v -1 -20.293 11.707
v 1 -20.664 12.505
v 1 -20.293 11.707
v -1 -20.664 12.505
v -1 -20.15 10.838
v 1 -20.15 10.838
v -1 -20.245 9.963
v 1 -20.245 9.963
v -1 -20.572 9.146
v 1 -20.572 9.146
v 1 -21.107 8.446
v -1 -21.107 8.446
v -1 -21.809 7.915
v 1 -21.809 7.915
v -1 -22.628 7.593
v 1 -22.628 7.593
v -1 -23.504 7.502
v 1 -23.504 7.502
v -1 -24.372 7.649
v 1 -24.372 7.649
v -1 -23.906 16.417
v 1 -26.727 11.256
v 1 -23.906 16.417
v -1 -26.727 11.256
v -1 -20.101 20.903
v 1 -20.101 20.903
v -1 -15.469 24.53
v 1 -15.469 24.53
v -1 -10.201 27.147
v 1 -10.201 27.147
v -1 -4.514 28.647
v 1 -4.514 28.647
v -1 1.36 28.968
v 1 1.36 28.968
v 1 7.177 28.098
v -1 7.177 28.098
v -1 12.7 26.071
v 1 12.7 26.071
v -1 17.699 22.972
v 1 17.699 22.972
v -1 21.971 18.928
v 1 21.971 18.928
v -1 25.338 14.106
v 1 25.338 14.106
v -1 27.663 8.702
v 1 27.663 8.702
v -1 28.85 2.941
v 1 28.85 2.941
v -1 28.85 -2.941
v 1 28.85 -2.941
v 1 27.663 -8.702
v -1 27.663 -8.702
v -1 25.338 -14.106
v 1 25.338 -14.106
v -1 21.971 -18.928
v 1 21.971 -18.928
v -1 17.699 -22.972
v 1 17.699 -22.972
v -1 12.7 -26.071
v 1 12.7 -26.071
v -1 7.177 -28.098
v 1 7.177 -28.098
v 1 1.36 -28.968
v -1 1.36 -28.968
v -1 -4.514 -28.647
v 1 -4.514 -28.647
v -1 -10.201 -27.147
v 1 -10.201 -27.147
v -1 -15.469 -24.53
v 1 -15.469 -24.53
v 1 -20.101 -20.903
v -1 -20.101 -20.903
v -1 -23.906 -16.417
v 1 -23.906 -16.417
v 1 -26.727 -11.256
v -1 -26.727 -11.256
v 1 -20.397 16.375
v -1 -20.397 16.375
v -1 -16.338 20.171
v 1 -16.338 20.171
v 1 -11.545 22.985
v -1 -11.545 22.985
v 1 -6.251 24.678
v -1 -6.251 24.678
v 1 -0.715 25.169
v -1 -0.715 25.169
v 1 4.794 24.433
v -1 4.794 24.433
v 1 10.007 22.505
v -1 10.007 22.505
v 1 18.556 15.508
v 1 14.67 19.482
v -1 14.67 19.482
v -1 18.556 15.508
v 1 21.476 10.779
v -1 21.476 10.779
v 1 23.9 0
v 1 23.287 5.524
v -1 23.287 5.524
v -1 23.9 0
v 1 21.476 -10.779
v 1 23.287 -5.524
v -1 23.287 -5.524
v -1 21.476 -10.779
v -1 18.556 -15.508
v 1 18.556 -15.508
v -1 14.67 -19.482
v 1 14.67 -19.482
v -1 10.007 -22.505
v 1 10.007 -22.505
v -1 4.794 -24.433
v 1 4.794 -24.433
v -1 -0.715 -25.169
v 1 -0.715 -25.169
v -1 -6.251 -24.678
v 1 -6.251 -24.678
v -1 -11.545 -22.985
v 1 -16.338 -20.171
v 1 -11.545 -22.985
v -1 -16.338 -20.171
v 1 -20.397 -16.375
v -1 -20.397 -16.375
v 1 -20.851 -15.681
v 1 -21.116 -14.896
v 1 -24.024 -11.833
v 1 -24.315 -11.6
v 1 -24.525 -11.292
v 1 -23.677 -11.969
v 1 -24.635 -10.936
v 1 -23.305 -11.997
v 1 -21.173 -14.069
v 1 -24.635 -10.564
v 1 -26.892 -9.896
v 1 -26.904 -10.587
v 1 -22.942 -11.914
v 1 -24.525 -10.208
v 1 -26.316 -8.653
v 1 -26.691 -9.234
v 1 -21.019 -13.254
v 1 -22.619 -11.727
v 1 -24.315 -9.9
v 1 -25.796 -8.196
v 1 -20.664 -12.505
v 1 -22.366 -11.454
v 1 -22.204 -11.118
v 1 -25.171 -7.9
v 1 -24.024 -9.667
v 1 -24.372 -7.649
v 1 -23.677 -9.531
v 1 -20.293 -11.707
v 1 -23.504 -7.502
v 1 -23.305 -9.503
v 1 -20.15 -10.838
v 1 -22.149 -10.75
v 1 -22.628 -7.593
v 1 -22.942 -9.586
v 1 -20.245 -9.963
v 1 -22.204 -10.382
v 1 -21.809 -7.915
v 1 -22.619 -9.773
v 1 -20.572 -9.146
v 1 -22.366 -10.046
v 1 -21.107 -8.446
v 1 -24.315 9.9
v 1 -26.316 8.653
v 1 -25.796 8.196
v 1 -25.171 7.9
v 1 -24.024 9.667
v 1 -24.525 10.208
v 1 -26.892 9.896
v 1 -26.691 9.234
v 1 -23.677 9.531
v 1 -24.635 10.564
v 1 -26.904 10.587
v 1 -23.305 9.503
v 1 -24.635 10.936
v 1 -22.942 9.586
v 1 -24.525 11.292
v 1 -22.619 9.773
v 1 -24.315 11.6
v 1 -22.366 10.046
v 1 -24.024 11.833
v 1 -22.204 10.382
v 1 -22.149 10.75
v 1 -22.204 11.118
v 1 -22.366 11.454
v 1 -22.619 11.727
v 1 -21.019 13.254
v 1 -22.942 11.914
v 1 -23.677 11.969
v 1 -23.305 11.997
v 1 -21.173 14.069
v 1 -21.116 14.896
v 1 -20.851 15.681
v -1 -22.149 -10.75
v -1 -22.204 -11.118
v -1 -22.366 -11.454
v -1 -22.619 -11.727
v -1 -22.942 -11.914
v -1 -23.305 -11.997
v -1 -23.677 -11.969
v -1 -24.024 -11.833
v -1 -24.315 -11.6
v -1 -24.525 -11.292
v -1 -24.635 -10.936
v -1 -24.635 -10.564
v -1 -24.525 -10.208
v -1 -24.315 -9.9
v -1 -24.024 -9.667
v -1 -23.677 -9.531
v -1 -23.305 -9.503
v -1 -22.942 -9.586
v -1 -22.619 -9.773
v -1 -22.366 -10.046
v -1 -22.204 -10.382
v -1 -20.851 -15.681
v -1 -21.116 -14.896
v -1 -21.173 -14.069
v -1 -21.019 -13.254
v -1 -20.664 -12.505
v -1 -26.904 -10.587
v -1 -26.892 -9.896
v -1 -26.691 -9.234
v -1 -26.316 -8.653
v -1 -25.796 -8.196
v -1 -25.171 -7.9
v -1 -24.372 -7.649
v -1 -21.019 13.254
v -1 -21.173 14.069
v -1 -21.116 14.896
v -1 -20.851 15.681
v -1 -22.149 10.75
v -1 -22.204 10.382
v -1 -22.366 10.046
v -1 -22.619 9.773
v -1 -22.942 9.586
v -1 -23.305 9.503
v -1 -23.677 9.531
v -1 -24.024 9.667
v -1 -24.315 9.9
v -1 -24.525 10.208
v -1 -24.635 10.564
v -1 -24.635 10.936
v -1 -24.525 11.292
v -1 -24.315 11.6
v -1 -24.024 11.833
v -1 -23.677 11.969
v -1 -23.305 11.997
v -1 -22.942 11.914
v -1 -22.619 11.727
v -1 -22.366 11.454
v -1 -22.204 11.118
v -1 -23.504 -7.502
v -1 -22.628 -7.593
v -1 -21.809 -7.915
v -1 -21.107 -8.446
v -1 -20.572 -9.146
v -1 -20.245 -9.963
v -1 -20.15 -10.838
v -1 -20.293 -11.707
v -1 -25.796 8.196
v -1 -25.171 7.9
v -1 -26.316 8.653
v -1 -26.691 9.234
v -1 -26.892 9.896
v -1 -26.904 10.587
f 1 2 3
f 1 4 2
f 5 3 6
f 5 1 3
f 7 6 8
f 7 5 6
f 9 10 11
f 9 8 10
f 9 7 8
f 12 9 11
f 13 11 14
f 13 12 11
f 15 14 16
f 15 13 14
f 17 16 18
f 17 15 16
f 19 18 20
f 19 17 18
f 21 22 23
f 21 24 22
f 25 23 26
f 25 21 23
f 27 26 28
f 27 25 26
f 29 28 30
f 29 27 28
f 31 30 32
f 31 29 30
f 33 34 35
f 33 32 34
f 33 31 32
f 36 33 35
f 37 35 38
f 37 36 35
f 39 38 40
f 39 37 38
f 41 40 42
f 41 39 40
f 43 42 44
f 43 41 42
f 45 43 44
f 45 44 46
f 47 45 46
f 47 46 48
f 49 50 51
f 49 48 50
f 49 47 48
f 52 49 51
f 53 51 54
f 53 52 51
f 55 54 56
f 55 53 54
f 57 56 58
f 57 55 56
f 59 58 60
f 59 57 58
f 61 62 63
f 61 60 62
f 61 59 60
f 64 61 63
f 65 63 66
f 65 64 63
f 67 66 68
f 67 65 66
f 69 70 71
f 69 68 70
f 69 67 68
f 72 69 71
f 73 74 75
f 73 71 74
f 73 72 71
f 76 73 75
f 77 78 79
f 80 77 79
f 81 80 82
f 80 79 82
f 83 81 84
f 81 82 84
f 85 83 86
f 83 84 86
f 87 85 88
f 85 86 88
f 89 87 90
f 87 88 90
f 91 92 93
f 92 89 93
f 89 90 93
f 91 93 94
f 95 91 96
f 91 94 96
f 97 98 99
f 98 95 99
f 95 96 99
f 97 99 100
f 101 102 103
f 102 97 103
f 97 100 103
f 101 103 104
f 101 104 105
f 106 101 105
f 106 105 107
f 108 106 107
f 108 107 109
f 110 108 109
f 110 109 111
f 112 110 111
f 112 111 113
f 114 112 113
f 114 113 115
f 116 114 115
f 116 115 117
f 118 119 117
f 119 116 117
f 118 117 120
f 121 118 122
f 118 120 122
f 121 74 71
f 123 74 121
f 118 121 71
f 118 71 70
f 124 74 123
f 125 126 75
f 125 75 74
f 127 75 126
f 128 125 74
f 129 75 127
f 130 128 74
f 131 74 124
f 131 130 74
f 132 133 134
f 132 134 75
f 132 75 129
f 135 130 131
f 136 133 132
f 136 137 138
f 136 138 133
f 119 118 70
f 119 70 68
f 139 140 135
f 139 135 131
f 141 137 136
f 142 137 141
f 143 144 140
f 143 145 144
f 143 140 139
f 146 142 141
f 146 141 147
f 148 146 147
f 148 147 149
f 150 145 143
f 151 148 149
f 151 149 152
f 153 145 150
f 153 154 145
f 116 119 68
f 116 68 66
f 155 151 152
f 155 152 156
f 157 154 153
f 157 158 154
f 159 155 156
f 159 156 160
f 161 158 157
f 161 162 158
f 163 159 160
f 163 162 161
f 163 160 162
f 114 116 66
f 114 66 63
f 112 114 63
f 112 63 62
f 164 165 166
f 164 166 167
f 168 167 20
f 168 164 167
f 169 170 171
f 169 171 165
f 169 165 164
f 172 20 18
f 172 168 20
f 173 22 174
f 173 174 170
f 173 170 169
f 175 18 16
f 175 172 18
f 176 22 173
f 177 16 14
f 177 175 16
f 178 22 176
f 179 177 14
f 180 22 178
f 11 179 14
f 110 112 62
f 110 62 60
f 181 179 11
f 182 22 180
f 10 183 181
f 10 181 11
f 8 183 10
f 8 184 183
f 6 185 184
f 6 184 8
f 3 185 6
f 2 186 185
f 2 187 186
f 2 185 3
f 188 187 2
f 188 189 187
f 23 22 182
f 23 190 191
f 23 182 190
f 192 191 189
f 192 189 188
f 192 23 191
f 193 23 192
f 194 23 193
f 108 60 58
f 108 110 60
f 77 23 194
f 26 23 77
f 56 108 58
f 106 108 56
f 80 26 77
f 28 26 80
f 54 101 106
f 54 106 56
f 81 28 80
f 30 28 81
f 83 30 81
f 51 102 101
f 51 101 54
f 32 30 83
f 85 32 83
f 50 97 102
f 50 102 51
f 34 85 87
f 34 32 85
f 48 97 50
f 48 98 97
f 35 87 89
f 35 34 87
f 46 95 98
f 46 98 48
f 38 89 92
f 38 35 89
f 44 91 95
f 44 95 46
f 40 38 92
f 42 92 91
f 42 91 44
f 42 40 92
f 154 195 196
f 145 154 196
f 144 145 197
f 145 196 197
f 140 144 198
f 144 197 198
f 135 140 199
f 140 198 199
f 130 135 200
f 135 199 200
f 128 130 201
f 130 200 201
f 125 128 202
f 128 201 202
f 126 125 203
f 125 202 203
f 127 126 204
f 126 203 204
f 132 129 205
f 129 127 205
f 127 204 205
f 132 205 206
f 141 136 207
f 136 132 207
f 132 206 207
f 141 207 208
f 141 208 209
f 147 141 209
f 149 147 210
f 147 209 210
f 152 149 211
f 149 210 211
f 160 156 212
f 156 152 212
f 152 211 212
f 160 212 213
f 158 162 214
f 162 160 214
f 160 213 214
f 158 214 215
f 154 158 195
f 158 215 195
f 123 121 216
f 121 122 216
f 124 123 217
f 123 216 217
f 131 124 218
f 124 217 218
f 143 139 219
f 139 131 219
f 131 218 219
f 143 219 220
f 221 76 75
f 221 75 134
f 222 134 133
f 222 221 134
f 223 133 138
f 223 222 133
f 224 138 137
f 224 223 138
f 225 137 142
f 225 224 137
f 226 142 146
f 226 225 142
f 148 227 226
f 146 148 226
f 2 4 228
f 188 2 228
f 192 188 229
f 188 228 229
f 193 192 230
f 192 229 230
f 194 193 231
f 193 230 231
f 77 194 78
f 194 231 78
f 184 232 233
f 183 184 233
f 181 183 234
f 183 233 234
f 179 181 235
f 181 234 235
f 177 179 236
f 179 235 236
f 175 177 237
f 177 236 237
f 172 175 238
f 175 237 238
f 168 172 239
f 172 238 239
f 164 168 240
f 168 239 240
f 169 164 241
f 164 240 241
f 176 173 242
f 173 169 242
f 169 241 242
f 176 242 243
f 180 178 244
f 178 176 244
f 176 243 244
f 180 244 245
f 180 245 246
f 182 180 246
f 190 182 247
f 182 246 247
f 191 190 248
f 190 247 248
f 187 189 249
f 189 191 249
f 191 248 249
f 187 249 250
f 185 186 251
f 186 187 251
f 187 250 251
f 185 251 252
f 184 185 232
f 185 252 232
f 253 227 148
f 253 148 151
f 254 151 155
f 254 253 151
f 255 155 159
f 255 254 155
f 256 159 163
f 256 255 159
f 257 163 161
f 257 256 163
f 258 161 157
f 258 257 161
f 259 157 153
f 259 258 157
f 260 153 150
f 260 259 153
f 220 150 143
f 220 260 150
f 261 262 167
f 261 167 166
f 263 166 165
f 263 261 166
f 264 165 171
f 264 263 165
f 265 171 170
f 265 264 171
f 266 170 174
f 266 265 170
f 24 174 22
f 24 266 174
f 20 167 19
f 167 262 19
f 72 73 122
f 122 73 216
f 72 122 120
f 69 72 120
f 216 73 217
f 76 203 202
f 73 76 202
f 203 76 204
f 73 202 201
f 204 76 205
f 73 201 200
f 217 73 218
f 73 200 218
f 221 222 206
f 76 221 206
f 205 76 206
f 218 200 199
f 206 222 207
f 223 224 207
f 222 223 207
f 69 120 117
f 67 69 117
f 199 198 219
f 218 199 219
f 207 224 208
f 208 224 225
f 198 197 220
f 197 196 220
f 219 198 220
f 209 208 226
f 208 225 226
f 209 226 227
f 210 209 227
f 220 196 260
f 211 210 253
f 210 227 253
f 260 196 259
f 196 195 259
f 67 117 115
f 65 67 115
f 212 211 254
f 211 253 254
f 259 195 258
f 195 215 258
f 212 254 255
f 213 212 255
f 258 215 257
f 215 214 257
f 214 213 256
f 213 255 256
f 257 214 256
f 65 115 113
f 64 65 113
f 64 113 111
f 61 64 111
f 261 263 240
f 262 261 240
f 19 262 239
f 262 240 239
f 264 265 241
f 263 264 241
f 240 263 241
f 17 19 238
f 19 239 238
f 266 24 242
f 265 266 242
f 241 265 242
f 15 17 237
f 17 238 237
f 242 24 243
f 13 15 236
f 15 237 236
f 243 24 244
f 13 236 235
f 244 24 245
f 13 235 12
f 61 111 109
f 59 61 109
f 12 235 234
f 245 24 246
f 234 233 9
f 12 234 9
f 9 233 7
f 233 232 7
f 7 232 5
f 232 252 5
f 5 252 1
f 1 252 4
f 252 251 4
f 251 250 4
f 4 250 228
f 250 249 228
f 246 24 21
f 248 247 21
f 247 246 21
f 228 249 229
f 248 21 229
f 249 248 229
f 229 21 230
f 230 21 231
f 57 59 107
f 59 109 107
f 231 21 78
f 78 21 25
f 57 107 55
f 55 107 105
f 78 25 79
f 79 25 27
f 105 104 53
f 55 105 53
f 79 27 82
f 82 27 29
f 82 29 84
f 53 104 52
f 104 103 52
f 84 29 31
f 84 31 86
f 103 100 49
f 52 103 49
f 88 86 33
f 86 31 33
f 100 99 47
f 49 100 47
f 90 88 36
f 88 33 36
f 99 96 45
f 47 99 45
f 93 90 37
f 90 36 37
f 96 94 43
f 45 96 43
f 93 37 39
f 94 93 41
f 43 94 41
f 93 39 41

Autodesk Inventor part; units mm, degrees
sketch "Sketch_3" plane through (0, 0, 0) normal (1, 0, 0) x (0, 1, 0)
  arc A0 (-26.7266, -11.2556) -> (-26.7266, 11.2556) centre (0, 0) ccw
  arc A1 (-26.7266, 11.2556) -> (-25.1712, 7.9) centre (-24.4226, 10.2853) ccw
  line L0 (-25.1712, 7.9) -> (-24.3719, 7.6491)
  arc A2 (-24.3719, 7.6491) -> (-20.6636, 12.5054) centre (-23.3987, 10.75) ccw
  arc A3 (-20.397, 16.3747) -> (-20.6636, 12.5054) centre (-17.9284, 14.2608) ccw
  arc A4 (-20.397, -16.3747) -> (-20.397, 16.3747) centre (-1.275, 0) ccw
  arc A5 (-20.6636, -12.5054) -> (-20.397, -16.3747) centre (-17.9284, -14.2608) ccw
  arc A6 (-20.6636, -12.5054) -> (-24.3719, -7.6491) centre (-23.3987, -10.75) ccw
  line L1 (-24.3719, -7.6491) -> (-25.1712, -7.9)
  arc A7 (-25.1712, -7.9) -> (-26.7266, -11.2556) centre (-24.4226, -10.2853) ccw
  circle A8 centre (-23.3987, -10.75) radius 1.25
  circle A9 centre (-23.3987, 10.75) radius 1.25
extrude "Extrusion1" add sketch "Sketch_3" along normal mid plane 2
ref_plane "rr_XY" through (-1, 0, 0) normal (1, 0, 0) x (0, 0, -1)
ref_plane "rr_YZ" through (-1, 0, 0) normal (0, 0, -1) x (0, 1, 0)
ref_plane "rr_ZX" through (-1, 0, 0) normal (0, 1, 0) x (1, 0, 0)
properties part number "RRING-C-INT-S-55"
